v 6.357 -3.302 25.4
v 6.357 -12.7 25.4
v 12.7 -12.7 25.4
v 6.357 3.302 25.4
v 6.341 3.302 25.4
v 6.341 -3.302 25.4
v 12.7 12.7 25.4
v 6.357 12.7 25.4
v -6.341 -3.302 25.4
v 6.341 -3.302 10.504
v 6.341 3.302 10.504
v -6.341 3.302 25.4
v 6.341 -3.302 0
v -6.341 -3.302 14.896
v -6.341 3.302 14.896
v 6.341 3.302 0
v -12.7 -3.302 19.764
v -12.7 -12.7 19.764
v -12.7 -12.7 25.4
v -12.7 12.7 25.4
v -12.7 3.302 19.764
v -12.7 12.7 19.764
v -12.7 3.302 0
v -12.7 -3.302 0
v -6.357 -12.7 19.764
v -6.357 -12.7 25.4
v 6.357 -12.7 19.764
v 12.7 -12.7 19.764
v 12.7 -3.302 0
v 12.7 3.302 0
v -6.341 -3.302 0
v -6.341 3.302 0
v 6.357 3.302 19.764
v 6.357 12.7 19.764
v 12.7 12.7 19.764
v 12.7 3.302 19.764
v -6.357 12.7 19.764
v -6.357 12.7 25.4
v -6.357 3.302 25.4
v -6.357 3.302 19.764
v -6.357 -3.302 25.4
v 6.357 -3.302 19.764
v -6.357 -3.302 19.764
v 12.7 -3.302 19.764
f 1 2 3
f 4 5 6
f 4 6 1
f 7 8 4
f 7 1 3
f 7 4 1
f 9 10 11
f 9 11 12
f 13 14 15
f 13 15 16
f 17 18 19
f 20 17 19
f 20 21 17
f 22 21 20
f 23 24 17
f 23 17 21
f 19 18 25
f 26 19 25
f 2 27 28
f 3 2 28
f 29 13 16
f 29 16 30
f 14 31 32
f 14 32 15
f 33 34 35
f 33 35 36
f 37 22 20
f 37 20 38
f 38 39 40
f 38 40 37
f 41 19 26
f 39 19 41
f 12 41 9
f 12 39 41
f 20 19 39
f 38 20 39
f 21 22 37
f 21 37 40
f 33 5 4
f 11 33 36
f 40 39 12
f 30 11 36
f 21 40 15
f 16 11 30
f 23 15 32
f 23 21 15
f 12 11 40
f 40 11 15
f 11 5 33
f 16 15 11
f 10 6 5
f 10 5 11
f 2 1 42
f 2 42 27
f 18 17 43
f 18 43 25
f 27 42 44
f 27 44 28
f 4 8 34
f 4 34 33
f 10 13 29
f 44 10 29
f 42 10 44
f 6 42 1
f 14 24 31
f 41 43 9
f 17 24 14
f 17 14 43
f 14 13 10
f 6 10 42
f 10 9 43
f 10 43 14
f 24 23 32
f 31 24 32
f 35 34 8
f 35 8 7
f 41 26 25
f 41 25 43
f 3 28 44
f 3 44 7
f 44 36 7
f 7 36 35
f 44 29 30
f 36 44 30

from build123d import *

# Parameters (mm, degrees)
F0_W     = 25.4
F0_H     = 25.4
F1_DEPTH = 25.4
F5_DEPTH = 25.401
F6_DEPTH = 25.401
F7_DEPTH = 25.401


with BuildPart() as f1:
    # F0 (on Top) → F1 (new body)
    with BuildSketch(Plane.XY):
        Rectangle(F0_W, F0_H)
    extrude(amount=F1_DEPTH)

    # F2 (on face) → F5 (intersect, through all)
    with BuildSketch(Plane.XY.offset(25.4)):
        Polygon((-6.357004, 12.7), (-12.7, 12.7), (-12.7, -12.7), (-6.357004, -12.7), (-6.357004, -3.302), (0, -3.302), (6.357004, -3.302), (6.357004, -12.7), (12.7, -12.7), (12.7, 12.7), (6.357004, 12.7), (6.357004, 3.302), (0, 3.302), (-6.357004, 3.302), align=None)
    extrude(amount=-F5_DEPTH, mode=Mode.INTERSECT)

    # F3 (on face) → F6 (intersect, through all)
    with BuildSketch(Plane(origin=(-12.7, 0, 0), x_dir=(0, -1, 0), z_dir=(-1, 0, 0))):
        Polygon((0, 25.4), (-12.7, 25.4), (-12.7, 19.764362), (-3.302, 19.764362), (-3.302, 0), (0, 0), (3.302, 0), (3.302, 19.764362), (12.7, 19.764362), (12.7, 25.4), align=None)
    extrude(amount=-F6_DEPTH, mode=Mode.INTERSECT)

    # F4 (on face) → F7 (intersect, through all)
    with BuildSketch(Plane.XZ.offset(12.7)):
        Polygon((-6.340738, 25.4), (-12.7, 25.4), (-12.7, 0), (-6.340738, 0), (-6.340738, 14.896067), (6.340738, 0), (12.7, 0), (12.7, 25.4), (6.340738, 25.4), (6.340738, 10.503933), align=None)
    extrude(amount=-F7_DEPTH, mode=Mode.INTERSECT)


solid = f1.part
